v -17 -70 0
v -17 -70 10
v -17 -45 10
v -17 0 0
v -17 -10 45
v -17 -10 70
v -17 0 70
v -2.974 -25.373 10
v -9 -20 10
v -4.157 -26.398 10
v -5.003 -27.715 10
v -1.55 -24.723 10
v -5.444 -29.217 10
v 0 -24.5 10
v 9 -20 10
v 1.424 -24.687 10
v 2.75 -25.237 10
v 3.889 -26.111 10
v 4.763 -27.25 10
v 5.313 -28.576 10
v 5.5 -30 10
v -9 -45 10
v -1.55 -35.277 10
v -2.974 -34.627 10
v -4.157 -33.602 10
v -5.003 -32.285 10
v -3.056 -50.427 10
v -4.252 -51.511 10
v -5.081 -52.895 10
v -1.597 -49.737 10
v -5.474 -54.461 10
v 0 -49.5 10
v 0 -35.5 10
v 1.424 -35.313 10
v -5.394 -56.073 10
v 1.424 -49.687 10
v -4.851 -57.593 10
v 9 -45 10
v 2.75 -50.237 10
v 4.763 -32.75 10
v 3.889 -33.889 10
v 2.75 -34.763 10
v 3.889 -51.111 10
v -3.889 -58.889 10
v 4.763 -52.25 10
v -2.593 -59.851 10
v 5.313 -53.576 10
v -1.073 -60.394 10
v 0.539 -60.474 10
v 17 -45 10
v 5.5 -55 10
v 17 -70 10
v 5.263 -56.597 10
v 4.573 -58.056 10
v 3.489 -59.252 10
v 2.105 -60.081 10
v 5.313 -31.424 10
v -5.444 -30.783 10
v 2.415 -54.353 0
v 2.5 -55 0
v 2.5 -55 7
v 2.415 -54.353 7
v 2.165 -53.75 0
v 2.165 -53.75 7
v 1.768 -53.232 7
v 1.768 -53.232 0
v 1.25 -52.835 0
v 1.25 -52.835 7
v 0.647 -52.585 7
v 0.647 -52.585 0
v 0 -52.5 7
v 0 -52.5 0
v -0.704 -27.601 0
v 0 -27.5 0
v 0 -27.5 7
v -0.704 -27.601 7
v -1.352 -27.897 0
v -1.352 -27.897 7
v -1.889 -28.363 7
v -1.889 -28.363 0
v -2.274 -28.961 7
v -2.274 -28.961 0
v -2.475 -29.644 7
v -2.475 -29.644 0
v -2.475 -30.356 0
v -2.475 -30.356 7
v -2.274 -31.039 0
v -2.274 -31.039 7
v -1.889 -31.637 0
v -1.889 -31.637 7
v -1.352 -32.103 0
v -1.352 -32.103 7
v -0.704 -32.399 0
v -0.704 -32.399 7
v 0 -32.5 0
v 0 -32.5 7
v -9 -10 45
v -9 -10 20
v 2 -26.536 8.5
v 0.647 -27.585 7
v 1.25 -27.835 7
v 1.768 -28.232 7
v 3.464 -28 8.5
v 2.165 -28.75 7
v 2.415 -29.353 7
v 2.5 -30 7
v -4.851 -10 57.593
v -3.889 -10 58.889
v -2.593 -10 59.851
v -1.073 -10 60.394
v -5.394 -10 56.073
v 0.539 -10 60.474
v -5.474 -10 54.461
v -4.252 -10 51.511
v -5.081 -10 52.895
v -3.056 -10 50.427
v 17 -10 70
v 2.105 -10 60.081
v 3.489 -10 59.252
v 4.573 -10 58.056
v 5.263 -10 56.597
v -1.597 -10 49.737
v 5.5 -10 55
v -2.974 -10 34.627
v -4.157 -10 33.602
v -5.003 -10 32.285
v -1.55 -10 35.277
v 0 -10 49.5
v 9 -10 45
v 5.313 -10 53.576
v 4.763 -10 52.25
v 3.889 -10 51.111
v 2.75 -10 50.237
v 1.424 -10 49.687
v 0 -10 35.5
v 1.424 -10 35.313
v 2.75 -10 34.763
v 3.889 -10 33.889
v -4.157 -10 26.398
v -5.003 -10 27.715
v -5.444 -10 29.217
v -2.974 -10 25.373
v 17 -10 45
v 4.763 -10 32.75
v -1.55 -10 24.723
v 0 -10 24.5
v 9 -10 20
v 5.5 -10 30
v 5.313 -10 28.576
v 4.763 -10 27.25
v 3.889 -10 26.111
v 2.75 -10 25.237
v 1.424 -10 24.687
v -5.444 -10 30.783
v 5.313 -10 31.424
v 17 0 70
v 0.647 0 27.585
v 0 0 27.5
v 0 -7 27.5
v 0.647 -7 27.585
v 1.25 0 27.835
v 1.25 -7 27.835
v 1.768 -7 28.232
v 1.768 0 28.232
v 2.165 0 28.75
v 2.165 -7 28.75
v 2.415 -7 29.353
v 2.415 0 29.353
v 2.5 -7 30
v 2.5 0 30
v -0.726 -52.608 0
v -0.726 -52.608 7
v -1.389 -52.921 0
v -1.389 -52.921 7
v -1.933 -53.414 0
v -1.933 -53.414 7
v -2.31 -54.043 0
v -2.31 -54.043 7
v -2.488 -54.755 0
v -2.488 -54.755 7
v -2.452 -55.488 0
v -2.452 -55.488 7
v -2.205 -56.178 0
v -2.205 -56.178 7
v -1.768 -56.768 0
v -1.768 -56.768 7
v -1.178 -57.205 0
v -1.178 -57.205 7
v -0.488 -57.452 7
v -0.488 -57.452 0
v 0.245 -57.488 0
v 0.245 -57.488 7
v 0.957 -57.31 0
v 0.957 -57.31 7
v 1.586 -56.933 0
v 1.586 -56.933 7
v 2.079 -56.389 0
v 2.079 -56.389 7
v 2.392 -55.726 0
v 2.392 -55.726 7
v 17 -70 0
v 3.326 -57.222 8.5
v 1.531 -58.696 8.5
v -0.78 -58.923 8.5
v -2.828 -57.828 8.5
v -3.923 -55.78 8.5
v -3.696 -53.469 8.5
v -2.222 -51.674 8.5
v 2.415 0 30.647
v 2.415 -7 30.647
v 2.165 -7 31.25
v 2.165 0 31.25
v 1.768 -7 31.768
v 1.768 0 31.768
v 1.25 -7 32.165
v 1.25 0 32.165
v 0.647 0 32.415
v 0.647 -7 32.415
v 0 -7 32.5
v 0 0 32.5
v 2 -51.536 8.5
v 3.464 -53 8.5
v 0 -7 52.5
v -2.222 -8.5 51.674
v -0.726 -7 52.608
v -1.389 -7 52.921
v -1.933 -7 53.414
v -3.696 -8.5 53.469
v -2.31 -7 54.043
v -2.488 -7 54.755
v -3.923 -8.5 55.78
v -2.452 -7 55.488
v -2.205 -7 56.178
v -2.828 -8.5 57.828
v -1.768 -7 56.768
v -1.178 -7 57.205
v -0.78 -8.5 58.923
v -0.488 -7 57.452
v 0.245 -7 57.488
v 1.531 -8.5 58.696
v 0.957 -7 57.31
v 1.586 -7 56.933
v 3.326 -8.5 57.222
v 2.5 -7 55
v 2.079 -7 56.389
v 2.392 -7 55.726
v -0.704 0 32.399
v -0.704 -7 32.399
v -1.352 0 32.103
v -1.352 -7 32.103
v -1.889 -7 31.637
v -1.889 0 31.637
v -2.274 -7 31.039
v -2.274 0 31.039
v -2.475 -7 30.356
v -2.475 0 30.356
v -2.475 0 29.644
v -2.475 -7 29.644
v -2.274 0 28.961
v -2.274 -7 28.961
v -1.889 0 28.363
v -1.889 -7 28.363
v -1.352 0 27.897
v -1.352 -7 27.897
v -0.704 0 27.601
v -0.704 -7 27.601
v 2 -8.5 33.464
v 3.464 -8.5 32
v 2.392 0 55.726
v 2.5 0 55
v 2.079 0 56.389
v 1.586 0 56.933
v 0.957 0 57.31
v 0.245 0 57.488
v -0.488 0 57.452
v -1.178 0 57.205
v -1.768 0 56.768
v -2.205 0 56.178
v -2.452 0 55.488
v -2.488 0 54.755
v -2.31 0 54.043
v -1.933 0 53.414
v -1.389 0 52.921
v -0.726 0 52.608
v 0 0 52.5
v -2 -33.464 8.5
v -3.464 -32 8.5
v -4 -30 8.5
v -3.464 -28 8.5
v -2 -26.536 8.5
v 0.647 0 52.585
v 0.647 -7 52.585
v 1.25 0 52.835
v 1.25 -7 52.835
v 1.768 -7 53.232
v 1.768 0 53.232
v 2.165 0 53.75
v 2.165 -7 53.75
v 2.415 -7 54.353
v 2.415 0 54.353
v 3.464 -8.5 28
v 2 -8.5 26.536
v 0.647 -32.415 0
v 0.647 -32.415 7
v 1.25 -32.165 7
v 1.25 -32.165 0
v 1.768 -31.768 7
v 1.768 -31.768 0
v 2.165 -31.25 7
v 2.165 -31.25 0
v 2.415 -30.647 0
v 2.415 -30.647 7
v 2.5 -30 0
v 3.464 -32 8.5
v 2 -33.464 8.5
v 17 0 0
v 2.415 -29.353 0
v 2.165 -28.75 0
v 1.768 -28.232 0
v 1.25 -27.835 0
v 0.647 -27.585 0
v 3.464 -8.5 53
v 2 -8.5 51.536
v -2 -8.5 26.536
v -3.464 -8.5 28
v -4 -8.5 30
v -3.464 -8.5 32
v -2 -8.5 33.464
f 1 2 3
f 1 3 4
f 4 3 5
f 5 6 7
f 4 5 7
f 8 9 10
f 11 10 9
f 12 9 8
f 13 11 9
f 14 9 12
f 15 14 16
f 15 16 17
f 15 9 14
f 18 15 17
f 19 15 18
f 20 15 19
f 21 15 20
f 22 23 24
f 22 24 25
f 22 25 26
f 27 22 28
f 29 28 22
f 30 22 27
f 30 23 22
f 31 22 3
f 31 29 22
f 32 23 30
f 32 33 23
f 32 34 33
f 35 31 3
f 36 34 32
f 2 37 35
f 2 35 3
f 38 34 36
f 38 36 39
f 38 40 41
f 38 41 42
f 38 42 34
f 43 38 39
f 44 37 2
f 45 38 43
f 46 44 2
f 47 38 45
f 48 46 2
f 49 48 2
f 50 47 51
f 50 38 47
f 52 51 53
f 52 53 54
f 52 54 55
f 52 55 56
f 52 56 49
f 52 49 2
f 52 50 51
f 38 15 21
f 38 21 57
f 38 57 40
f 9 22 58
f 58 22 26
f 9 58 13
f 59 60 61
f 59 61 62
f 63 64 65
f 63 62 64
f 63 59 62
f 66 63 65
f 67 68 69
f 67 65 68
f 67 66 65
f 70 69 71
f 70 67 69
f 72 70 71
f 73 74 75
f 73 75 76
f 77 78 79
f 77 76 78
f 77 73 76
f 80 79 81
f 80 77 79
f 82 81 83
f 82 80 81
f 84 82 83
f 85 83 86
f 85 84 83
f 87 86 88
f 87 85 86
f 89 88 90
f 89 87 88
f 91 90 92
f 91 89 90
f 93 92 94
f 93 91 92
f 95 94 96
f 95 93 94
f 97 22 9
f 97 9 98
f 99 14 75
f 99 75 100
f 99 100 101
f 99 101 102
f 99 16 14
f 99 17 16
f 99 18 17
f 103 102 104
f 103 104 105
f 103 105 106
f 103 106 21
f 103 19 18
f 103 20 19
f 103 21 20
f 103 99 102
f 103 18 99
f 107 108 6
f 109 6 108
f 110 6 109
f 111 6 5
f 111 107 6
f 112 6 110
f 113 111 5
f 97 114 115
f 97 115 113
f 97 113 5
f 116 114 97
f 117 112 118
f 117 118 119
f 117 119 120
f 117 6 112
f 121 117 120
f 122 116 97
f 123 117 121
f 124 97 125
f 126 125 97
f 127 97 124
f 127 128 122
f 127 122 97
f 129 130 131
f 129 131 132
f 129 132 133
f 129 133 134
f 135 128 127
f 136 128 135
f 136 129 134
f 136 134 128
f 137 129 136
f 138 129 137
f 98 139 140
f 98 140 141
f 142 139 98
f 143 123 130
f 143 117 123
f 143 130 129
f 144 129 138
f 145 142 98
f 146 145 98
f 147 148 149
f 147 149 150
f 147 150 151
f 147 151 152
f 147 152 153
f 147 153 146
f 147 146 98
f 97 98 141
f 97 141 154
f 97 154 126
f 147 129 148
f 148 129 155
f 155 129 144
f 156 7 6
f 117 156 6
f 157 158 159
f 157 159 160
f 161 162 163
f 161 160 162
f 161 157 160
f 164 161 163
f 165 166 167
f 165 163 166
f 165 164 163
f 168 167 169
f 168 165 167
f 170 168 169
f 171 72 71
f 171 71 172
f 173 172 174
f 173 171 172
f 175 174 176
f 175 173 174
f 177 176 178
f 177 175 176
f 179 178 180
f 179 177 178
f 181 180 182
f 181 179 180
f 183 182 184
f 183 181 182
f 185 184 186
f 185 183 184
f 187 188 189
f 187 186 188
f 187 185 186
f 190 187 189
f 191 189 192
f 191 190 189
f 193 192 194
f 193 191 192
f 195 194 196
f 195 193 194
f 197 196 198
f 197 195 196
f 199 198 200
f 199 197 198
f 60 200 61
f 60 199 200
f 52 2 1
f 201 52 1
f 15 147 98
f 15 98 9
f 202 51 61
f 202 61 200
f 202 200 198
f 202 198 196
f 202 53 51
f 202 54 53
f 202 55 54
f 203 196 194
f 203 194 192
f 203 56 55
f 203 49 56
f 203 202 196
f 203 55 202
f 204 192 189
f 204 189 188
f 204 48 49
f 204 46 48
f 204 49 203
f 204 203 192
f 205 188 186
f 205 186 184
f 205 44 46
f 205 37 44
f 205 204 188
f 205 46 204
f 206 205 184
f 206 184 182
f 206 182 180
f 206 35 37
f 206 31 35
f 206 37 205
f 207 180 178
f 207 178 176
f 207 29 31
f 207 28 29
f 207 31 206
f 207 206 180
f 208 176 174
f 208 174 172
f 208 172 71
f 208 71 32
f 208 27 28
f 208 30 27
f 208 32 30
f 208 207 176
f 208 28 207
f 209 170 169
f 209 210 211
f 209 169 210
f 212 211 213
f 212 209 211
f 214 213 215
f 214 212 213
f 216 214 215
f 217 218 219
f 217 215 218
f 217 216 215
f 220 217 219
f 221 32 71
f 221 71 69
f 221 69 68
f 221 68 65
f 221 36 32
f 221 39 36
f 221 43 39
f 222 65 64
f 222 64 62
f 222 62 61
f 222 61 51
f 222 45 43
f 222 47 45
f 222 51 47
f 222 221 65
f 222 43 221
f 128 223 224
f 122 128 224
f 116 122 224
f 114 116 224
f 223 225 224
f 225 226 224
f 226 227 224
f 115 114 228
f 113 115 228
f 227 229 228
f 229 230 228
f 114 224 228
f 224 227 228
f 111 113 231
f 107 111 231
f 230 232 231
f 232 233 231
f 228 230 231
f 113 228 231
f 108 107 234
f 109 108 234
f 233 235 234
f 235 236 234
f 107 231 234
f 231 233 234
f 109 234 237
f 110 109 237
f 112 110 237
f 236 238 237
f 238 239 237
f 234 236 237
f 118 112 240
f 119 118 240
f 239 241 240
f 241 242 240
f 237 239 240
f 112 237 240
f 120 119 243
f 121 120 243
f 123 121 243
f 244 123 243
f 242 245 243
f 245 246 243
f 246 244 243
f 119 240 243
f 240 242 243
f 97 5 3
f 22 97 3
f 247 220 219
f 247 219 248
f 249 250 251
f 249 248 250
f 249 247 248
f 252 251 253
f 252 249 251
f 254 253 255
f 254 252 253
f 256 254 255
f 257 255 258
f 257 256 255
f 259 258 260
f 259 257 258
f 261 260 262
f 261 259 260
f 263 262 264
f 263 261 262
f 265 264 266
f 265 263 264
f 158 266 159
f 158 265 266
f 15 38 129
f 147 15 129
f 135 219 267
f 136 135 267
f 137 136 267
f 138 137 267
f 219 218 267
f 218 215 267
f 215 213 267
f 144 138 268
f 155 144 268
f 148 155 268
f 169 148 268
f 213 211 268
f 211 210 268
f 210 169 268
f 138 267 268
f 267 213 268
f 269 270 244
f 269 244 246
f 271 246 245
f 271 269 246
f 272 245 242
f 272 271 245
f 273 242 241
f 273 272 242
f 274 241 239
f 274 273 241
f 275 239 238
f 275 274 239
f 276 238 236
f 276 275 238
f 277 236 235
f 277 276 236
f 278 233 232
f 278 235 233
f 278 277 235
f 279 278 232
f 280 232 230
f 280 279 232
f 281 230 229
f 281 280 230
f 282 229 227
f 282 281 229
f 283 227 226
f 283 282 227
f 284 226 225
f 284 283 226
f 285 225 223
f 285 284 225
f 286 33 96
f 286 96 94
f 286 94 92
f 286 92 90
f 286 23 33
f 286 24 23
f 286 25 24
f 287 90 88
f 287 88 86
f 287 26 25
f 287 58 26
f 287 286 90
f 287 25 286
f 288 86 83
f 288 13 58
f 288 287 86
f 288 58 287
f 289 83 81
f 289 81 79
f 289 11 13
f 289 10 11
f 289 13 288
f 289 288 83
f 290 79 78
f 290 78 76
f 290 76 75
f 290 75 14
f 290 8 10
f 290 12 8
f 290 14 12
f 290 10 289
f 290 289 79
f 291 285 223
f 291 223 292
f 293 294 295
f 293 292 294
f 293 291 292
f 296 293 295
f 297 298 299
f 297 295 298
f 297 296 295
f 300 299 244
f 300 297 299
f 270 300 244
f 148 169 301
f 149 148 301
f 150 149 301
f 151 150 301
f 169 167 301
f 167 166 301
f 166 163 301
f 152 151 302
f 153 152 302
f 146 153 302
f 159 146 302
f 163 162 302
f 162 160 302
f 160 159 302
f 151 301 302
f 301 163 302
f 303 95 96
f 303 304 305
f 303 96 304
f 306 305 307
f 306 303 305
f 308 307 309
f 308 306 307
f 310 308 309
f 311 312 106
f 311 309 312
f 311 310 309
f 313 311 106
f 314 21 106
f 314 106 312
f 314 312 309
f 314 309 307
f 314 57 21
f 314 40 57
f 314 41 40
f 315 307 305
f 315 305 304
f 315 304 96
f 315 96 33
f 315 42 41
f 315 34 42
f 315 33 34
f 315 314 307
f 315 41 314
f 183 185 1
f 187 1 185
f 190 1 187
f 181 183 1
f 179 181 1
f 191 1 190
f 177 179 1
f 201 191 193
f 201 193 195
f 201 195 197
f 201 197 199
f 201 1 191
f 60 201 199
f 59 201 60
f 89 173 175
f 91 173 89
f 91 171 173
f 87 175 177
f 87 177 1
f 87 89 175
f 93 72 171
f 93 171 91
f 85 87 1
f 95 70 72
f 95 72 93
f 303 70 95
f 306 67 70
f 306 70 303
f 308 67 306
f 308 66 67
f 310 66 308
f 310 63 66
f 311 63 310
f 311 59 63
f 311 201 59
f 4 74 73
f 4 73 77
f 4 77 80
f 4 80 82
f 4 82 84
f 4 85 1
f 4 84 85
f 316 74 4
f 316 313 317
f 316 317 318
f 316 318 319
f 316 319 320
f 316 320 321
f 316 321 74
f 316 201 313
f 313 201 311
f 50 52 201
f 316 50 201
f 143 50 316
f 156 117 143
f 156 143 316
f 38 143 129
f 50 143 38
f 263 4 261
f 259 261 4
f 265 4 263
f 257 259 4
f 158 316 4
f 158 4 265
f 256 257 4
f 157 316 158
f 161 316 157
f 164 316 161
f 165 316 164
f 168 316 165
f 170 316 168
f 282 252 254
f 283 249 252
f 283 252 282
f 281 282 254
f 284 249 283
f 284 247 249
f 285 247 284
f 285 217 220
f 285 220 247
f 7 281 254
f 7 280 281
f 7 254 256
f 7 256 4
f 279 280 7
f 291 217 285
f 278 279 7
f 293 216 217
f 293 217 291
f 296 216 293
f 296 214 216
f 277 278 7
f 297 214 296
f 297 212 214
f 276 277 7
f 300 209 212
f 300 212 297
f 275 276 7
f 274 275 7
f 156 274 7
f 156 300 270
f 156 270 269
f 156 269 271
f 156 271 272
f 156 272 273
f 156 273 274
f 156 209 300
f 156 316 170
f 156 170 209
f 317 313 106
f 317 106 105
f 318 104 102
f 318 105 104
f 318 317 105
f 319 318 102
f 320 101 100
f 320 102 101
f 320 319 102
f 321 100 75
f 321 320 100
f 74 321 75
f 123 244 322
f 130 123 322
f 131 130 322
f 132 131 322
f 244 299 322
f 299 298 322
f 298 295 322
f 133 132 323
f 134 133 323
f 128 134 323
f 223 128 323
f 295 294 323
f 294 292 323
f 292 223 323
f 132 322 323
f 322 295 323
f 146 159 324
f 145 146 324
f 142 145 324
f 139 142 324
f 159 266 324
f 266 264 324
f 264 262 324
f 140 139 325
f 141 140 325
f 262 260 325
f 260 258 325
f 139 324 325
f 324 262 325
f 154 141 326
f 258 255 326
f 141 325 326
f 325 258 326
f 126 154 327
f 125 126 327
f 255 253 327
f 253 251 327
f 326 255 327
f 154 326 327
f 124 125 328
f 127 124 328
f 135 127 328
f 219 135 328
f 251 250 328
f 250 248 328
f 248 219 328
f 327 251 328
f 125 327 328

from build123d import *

# Parameters (mm, degrees)
F1_DEPTH  = 17
F3_DEPTH  = 25
F6_DEPTH  = 25
F8_SIZE   = 3
F9_W      = 25
F9_H      = 10
F10_DEPTH = 4


with BuildPart() as f1:
    # F0 (on Right) → F1 (new body, symmetric)
    with BuildSketch(Plane.YZ):
        Polygon((-70, 0), (0, 0), (0, 70), (-10, 70), (-10, 20), (-20, 10), (-70, 10), align=None)
    extrude(amount=F1_DEPTH, both=True)


with BuildPart() as f3:
    # F2 (on Front) → F3 (new body)
    with BuildSketch(Plane.XZ):
        with BuildLine():
            ThreePointArc((0, 32.5), (-2.5, 30), (0, 27.5))
            Line((0, 27.5), (0, 30))
            Line((0, 30), (0, 32.5))
        make_face()
        with BuildLine():
            Line((0, 30), (0, 27.5))
            ThreePointArc((0, 27.5), (1.767766953, 28.232233047), (2.5, 30))
            ThreePointArc((2.5, 30), (1.767766953, 31.767766953), (0, 32.5))
            Line((0, 32.5), (0, 30))
        make_face()
    extrude(amount=F3_DEPTH)


with BuildPart() as f3b:
    # F2 (on Front) → F3, piece 2 (new body)
    with BuildSketch(Plane.XZ):
        with BuildLine():
            ThreePointArc((2.5, 55), (-1.767766953, 56.767766953), (0, 52.5))
            ThreePointArc((0, 52.5), (1.767766953, 53.232233047), (2.5, 55))
        make_face()
    extrude(amount=F3_DEPTH)


with BuildPart() as f1_1:
    add(f1.part)

    # F4: cut F3b, F3
    add(f3b.part, mode=Mode.SUBTRACT)
    add(f3.part, mode=Mode.SUBTRACT)


with BuildPart() as f6:
    # F5 (on Top) → F6 (new body)
    with BuildSketch(Plane.XY):
        with BuildLine():
            ThreePointArc((2.5, -30), (1.767766953, -28.232233047), (0, -27.5))
            Line((0, -27.5), (0, -30))
            Line((0, -30), (0, -32.5))
            ThreePointArc((0, -32.5), (1.767766953, -31.767766953), (2.5, -30))
        make_face()
        with BuildLine():
            Line((0, -30), (0, -27.5))
            ThreePointArc((0, -27.5), (-2.5, -30), (0, -32.5))
            Line((0, -32.5), (0, -30))
        make_face()
    extrude(amount=F6_DEPTH)


with BuildPart() as f6b:
    # F5 (on Top) → F6, piece 2 (new body)
    with BuildSketch(Plane.XY):
        with BuildLine():
            ThreePointArc((2.5, -55), (1.767766953, -53.232233047), (0, -52.5))
            ThreePointArc((0, -52.5), (-1.767766953, -56.767766953), (2.5, -55))
        make_face()
    extrude(amount=F6_DEPTH)


with BuildPart() as f1_2:
    add(f1_1.part)

    # F7: cut F6, F6b
    add(f6.part, mode=Mode.SUBTRACT)
    add(f6b.part, mode=Mode.SUBTRACT)

    # F8
    f8_edges = [f1_2.edges().sort_by_distance(p)[0] for p in [
        (-2.5, -30, 10),
        (-2.5, -55, 10),
        (0, -10, 32.5),
        (0, -10, 57.5),
    ]]
    chamfer(f8_edges, length=F8_SIZE)



with BuildPart() as f10:
    # F9 (on Right) → F10 (new body, symmetric)
    with BuildSketch(Plane.YZ):
        Polygon((-45, 0), (0, 0), (0, 70), (-10, 70), (-10, 45), (-45, 10), align=None)
        with Locations((-57.5, 5)):
            Rectangle(F9_W, F9_H)
    extrude(amount=F10_DEPTH, both=True)


with BuildPart() as f10_1:
    # F11: moved
    add(f10.part.moved(Location((13, 0, 0))))


with BuildPart() as f1_3:
    add(f1_2.part)

    add(f10_1.part)  # F12 merges F10
    # F12: F10 across plane
    add(f10_1.part.mirror(Plane.YZ))


solid = f1_3.part
